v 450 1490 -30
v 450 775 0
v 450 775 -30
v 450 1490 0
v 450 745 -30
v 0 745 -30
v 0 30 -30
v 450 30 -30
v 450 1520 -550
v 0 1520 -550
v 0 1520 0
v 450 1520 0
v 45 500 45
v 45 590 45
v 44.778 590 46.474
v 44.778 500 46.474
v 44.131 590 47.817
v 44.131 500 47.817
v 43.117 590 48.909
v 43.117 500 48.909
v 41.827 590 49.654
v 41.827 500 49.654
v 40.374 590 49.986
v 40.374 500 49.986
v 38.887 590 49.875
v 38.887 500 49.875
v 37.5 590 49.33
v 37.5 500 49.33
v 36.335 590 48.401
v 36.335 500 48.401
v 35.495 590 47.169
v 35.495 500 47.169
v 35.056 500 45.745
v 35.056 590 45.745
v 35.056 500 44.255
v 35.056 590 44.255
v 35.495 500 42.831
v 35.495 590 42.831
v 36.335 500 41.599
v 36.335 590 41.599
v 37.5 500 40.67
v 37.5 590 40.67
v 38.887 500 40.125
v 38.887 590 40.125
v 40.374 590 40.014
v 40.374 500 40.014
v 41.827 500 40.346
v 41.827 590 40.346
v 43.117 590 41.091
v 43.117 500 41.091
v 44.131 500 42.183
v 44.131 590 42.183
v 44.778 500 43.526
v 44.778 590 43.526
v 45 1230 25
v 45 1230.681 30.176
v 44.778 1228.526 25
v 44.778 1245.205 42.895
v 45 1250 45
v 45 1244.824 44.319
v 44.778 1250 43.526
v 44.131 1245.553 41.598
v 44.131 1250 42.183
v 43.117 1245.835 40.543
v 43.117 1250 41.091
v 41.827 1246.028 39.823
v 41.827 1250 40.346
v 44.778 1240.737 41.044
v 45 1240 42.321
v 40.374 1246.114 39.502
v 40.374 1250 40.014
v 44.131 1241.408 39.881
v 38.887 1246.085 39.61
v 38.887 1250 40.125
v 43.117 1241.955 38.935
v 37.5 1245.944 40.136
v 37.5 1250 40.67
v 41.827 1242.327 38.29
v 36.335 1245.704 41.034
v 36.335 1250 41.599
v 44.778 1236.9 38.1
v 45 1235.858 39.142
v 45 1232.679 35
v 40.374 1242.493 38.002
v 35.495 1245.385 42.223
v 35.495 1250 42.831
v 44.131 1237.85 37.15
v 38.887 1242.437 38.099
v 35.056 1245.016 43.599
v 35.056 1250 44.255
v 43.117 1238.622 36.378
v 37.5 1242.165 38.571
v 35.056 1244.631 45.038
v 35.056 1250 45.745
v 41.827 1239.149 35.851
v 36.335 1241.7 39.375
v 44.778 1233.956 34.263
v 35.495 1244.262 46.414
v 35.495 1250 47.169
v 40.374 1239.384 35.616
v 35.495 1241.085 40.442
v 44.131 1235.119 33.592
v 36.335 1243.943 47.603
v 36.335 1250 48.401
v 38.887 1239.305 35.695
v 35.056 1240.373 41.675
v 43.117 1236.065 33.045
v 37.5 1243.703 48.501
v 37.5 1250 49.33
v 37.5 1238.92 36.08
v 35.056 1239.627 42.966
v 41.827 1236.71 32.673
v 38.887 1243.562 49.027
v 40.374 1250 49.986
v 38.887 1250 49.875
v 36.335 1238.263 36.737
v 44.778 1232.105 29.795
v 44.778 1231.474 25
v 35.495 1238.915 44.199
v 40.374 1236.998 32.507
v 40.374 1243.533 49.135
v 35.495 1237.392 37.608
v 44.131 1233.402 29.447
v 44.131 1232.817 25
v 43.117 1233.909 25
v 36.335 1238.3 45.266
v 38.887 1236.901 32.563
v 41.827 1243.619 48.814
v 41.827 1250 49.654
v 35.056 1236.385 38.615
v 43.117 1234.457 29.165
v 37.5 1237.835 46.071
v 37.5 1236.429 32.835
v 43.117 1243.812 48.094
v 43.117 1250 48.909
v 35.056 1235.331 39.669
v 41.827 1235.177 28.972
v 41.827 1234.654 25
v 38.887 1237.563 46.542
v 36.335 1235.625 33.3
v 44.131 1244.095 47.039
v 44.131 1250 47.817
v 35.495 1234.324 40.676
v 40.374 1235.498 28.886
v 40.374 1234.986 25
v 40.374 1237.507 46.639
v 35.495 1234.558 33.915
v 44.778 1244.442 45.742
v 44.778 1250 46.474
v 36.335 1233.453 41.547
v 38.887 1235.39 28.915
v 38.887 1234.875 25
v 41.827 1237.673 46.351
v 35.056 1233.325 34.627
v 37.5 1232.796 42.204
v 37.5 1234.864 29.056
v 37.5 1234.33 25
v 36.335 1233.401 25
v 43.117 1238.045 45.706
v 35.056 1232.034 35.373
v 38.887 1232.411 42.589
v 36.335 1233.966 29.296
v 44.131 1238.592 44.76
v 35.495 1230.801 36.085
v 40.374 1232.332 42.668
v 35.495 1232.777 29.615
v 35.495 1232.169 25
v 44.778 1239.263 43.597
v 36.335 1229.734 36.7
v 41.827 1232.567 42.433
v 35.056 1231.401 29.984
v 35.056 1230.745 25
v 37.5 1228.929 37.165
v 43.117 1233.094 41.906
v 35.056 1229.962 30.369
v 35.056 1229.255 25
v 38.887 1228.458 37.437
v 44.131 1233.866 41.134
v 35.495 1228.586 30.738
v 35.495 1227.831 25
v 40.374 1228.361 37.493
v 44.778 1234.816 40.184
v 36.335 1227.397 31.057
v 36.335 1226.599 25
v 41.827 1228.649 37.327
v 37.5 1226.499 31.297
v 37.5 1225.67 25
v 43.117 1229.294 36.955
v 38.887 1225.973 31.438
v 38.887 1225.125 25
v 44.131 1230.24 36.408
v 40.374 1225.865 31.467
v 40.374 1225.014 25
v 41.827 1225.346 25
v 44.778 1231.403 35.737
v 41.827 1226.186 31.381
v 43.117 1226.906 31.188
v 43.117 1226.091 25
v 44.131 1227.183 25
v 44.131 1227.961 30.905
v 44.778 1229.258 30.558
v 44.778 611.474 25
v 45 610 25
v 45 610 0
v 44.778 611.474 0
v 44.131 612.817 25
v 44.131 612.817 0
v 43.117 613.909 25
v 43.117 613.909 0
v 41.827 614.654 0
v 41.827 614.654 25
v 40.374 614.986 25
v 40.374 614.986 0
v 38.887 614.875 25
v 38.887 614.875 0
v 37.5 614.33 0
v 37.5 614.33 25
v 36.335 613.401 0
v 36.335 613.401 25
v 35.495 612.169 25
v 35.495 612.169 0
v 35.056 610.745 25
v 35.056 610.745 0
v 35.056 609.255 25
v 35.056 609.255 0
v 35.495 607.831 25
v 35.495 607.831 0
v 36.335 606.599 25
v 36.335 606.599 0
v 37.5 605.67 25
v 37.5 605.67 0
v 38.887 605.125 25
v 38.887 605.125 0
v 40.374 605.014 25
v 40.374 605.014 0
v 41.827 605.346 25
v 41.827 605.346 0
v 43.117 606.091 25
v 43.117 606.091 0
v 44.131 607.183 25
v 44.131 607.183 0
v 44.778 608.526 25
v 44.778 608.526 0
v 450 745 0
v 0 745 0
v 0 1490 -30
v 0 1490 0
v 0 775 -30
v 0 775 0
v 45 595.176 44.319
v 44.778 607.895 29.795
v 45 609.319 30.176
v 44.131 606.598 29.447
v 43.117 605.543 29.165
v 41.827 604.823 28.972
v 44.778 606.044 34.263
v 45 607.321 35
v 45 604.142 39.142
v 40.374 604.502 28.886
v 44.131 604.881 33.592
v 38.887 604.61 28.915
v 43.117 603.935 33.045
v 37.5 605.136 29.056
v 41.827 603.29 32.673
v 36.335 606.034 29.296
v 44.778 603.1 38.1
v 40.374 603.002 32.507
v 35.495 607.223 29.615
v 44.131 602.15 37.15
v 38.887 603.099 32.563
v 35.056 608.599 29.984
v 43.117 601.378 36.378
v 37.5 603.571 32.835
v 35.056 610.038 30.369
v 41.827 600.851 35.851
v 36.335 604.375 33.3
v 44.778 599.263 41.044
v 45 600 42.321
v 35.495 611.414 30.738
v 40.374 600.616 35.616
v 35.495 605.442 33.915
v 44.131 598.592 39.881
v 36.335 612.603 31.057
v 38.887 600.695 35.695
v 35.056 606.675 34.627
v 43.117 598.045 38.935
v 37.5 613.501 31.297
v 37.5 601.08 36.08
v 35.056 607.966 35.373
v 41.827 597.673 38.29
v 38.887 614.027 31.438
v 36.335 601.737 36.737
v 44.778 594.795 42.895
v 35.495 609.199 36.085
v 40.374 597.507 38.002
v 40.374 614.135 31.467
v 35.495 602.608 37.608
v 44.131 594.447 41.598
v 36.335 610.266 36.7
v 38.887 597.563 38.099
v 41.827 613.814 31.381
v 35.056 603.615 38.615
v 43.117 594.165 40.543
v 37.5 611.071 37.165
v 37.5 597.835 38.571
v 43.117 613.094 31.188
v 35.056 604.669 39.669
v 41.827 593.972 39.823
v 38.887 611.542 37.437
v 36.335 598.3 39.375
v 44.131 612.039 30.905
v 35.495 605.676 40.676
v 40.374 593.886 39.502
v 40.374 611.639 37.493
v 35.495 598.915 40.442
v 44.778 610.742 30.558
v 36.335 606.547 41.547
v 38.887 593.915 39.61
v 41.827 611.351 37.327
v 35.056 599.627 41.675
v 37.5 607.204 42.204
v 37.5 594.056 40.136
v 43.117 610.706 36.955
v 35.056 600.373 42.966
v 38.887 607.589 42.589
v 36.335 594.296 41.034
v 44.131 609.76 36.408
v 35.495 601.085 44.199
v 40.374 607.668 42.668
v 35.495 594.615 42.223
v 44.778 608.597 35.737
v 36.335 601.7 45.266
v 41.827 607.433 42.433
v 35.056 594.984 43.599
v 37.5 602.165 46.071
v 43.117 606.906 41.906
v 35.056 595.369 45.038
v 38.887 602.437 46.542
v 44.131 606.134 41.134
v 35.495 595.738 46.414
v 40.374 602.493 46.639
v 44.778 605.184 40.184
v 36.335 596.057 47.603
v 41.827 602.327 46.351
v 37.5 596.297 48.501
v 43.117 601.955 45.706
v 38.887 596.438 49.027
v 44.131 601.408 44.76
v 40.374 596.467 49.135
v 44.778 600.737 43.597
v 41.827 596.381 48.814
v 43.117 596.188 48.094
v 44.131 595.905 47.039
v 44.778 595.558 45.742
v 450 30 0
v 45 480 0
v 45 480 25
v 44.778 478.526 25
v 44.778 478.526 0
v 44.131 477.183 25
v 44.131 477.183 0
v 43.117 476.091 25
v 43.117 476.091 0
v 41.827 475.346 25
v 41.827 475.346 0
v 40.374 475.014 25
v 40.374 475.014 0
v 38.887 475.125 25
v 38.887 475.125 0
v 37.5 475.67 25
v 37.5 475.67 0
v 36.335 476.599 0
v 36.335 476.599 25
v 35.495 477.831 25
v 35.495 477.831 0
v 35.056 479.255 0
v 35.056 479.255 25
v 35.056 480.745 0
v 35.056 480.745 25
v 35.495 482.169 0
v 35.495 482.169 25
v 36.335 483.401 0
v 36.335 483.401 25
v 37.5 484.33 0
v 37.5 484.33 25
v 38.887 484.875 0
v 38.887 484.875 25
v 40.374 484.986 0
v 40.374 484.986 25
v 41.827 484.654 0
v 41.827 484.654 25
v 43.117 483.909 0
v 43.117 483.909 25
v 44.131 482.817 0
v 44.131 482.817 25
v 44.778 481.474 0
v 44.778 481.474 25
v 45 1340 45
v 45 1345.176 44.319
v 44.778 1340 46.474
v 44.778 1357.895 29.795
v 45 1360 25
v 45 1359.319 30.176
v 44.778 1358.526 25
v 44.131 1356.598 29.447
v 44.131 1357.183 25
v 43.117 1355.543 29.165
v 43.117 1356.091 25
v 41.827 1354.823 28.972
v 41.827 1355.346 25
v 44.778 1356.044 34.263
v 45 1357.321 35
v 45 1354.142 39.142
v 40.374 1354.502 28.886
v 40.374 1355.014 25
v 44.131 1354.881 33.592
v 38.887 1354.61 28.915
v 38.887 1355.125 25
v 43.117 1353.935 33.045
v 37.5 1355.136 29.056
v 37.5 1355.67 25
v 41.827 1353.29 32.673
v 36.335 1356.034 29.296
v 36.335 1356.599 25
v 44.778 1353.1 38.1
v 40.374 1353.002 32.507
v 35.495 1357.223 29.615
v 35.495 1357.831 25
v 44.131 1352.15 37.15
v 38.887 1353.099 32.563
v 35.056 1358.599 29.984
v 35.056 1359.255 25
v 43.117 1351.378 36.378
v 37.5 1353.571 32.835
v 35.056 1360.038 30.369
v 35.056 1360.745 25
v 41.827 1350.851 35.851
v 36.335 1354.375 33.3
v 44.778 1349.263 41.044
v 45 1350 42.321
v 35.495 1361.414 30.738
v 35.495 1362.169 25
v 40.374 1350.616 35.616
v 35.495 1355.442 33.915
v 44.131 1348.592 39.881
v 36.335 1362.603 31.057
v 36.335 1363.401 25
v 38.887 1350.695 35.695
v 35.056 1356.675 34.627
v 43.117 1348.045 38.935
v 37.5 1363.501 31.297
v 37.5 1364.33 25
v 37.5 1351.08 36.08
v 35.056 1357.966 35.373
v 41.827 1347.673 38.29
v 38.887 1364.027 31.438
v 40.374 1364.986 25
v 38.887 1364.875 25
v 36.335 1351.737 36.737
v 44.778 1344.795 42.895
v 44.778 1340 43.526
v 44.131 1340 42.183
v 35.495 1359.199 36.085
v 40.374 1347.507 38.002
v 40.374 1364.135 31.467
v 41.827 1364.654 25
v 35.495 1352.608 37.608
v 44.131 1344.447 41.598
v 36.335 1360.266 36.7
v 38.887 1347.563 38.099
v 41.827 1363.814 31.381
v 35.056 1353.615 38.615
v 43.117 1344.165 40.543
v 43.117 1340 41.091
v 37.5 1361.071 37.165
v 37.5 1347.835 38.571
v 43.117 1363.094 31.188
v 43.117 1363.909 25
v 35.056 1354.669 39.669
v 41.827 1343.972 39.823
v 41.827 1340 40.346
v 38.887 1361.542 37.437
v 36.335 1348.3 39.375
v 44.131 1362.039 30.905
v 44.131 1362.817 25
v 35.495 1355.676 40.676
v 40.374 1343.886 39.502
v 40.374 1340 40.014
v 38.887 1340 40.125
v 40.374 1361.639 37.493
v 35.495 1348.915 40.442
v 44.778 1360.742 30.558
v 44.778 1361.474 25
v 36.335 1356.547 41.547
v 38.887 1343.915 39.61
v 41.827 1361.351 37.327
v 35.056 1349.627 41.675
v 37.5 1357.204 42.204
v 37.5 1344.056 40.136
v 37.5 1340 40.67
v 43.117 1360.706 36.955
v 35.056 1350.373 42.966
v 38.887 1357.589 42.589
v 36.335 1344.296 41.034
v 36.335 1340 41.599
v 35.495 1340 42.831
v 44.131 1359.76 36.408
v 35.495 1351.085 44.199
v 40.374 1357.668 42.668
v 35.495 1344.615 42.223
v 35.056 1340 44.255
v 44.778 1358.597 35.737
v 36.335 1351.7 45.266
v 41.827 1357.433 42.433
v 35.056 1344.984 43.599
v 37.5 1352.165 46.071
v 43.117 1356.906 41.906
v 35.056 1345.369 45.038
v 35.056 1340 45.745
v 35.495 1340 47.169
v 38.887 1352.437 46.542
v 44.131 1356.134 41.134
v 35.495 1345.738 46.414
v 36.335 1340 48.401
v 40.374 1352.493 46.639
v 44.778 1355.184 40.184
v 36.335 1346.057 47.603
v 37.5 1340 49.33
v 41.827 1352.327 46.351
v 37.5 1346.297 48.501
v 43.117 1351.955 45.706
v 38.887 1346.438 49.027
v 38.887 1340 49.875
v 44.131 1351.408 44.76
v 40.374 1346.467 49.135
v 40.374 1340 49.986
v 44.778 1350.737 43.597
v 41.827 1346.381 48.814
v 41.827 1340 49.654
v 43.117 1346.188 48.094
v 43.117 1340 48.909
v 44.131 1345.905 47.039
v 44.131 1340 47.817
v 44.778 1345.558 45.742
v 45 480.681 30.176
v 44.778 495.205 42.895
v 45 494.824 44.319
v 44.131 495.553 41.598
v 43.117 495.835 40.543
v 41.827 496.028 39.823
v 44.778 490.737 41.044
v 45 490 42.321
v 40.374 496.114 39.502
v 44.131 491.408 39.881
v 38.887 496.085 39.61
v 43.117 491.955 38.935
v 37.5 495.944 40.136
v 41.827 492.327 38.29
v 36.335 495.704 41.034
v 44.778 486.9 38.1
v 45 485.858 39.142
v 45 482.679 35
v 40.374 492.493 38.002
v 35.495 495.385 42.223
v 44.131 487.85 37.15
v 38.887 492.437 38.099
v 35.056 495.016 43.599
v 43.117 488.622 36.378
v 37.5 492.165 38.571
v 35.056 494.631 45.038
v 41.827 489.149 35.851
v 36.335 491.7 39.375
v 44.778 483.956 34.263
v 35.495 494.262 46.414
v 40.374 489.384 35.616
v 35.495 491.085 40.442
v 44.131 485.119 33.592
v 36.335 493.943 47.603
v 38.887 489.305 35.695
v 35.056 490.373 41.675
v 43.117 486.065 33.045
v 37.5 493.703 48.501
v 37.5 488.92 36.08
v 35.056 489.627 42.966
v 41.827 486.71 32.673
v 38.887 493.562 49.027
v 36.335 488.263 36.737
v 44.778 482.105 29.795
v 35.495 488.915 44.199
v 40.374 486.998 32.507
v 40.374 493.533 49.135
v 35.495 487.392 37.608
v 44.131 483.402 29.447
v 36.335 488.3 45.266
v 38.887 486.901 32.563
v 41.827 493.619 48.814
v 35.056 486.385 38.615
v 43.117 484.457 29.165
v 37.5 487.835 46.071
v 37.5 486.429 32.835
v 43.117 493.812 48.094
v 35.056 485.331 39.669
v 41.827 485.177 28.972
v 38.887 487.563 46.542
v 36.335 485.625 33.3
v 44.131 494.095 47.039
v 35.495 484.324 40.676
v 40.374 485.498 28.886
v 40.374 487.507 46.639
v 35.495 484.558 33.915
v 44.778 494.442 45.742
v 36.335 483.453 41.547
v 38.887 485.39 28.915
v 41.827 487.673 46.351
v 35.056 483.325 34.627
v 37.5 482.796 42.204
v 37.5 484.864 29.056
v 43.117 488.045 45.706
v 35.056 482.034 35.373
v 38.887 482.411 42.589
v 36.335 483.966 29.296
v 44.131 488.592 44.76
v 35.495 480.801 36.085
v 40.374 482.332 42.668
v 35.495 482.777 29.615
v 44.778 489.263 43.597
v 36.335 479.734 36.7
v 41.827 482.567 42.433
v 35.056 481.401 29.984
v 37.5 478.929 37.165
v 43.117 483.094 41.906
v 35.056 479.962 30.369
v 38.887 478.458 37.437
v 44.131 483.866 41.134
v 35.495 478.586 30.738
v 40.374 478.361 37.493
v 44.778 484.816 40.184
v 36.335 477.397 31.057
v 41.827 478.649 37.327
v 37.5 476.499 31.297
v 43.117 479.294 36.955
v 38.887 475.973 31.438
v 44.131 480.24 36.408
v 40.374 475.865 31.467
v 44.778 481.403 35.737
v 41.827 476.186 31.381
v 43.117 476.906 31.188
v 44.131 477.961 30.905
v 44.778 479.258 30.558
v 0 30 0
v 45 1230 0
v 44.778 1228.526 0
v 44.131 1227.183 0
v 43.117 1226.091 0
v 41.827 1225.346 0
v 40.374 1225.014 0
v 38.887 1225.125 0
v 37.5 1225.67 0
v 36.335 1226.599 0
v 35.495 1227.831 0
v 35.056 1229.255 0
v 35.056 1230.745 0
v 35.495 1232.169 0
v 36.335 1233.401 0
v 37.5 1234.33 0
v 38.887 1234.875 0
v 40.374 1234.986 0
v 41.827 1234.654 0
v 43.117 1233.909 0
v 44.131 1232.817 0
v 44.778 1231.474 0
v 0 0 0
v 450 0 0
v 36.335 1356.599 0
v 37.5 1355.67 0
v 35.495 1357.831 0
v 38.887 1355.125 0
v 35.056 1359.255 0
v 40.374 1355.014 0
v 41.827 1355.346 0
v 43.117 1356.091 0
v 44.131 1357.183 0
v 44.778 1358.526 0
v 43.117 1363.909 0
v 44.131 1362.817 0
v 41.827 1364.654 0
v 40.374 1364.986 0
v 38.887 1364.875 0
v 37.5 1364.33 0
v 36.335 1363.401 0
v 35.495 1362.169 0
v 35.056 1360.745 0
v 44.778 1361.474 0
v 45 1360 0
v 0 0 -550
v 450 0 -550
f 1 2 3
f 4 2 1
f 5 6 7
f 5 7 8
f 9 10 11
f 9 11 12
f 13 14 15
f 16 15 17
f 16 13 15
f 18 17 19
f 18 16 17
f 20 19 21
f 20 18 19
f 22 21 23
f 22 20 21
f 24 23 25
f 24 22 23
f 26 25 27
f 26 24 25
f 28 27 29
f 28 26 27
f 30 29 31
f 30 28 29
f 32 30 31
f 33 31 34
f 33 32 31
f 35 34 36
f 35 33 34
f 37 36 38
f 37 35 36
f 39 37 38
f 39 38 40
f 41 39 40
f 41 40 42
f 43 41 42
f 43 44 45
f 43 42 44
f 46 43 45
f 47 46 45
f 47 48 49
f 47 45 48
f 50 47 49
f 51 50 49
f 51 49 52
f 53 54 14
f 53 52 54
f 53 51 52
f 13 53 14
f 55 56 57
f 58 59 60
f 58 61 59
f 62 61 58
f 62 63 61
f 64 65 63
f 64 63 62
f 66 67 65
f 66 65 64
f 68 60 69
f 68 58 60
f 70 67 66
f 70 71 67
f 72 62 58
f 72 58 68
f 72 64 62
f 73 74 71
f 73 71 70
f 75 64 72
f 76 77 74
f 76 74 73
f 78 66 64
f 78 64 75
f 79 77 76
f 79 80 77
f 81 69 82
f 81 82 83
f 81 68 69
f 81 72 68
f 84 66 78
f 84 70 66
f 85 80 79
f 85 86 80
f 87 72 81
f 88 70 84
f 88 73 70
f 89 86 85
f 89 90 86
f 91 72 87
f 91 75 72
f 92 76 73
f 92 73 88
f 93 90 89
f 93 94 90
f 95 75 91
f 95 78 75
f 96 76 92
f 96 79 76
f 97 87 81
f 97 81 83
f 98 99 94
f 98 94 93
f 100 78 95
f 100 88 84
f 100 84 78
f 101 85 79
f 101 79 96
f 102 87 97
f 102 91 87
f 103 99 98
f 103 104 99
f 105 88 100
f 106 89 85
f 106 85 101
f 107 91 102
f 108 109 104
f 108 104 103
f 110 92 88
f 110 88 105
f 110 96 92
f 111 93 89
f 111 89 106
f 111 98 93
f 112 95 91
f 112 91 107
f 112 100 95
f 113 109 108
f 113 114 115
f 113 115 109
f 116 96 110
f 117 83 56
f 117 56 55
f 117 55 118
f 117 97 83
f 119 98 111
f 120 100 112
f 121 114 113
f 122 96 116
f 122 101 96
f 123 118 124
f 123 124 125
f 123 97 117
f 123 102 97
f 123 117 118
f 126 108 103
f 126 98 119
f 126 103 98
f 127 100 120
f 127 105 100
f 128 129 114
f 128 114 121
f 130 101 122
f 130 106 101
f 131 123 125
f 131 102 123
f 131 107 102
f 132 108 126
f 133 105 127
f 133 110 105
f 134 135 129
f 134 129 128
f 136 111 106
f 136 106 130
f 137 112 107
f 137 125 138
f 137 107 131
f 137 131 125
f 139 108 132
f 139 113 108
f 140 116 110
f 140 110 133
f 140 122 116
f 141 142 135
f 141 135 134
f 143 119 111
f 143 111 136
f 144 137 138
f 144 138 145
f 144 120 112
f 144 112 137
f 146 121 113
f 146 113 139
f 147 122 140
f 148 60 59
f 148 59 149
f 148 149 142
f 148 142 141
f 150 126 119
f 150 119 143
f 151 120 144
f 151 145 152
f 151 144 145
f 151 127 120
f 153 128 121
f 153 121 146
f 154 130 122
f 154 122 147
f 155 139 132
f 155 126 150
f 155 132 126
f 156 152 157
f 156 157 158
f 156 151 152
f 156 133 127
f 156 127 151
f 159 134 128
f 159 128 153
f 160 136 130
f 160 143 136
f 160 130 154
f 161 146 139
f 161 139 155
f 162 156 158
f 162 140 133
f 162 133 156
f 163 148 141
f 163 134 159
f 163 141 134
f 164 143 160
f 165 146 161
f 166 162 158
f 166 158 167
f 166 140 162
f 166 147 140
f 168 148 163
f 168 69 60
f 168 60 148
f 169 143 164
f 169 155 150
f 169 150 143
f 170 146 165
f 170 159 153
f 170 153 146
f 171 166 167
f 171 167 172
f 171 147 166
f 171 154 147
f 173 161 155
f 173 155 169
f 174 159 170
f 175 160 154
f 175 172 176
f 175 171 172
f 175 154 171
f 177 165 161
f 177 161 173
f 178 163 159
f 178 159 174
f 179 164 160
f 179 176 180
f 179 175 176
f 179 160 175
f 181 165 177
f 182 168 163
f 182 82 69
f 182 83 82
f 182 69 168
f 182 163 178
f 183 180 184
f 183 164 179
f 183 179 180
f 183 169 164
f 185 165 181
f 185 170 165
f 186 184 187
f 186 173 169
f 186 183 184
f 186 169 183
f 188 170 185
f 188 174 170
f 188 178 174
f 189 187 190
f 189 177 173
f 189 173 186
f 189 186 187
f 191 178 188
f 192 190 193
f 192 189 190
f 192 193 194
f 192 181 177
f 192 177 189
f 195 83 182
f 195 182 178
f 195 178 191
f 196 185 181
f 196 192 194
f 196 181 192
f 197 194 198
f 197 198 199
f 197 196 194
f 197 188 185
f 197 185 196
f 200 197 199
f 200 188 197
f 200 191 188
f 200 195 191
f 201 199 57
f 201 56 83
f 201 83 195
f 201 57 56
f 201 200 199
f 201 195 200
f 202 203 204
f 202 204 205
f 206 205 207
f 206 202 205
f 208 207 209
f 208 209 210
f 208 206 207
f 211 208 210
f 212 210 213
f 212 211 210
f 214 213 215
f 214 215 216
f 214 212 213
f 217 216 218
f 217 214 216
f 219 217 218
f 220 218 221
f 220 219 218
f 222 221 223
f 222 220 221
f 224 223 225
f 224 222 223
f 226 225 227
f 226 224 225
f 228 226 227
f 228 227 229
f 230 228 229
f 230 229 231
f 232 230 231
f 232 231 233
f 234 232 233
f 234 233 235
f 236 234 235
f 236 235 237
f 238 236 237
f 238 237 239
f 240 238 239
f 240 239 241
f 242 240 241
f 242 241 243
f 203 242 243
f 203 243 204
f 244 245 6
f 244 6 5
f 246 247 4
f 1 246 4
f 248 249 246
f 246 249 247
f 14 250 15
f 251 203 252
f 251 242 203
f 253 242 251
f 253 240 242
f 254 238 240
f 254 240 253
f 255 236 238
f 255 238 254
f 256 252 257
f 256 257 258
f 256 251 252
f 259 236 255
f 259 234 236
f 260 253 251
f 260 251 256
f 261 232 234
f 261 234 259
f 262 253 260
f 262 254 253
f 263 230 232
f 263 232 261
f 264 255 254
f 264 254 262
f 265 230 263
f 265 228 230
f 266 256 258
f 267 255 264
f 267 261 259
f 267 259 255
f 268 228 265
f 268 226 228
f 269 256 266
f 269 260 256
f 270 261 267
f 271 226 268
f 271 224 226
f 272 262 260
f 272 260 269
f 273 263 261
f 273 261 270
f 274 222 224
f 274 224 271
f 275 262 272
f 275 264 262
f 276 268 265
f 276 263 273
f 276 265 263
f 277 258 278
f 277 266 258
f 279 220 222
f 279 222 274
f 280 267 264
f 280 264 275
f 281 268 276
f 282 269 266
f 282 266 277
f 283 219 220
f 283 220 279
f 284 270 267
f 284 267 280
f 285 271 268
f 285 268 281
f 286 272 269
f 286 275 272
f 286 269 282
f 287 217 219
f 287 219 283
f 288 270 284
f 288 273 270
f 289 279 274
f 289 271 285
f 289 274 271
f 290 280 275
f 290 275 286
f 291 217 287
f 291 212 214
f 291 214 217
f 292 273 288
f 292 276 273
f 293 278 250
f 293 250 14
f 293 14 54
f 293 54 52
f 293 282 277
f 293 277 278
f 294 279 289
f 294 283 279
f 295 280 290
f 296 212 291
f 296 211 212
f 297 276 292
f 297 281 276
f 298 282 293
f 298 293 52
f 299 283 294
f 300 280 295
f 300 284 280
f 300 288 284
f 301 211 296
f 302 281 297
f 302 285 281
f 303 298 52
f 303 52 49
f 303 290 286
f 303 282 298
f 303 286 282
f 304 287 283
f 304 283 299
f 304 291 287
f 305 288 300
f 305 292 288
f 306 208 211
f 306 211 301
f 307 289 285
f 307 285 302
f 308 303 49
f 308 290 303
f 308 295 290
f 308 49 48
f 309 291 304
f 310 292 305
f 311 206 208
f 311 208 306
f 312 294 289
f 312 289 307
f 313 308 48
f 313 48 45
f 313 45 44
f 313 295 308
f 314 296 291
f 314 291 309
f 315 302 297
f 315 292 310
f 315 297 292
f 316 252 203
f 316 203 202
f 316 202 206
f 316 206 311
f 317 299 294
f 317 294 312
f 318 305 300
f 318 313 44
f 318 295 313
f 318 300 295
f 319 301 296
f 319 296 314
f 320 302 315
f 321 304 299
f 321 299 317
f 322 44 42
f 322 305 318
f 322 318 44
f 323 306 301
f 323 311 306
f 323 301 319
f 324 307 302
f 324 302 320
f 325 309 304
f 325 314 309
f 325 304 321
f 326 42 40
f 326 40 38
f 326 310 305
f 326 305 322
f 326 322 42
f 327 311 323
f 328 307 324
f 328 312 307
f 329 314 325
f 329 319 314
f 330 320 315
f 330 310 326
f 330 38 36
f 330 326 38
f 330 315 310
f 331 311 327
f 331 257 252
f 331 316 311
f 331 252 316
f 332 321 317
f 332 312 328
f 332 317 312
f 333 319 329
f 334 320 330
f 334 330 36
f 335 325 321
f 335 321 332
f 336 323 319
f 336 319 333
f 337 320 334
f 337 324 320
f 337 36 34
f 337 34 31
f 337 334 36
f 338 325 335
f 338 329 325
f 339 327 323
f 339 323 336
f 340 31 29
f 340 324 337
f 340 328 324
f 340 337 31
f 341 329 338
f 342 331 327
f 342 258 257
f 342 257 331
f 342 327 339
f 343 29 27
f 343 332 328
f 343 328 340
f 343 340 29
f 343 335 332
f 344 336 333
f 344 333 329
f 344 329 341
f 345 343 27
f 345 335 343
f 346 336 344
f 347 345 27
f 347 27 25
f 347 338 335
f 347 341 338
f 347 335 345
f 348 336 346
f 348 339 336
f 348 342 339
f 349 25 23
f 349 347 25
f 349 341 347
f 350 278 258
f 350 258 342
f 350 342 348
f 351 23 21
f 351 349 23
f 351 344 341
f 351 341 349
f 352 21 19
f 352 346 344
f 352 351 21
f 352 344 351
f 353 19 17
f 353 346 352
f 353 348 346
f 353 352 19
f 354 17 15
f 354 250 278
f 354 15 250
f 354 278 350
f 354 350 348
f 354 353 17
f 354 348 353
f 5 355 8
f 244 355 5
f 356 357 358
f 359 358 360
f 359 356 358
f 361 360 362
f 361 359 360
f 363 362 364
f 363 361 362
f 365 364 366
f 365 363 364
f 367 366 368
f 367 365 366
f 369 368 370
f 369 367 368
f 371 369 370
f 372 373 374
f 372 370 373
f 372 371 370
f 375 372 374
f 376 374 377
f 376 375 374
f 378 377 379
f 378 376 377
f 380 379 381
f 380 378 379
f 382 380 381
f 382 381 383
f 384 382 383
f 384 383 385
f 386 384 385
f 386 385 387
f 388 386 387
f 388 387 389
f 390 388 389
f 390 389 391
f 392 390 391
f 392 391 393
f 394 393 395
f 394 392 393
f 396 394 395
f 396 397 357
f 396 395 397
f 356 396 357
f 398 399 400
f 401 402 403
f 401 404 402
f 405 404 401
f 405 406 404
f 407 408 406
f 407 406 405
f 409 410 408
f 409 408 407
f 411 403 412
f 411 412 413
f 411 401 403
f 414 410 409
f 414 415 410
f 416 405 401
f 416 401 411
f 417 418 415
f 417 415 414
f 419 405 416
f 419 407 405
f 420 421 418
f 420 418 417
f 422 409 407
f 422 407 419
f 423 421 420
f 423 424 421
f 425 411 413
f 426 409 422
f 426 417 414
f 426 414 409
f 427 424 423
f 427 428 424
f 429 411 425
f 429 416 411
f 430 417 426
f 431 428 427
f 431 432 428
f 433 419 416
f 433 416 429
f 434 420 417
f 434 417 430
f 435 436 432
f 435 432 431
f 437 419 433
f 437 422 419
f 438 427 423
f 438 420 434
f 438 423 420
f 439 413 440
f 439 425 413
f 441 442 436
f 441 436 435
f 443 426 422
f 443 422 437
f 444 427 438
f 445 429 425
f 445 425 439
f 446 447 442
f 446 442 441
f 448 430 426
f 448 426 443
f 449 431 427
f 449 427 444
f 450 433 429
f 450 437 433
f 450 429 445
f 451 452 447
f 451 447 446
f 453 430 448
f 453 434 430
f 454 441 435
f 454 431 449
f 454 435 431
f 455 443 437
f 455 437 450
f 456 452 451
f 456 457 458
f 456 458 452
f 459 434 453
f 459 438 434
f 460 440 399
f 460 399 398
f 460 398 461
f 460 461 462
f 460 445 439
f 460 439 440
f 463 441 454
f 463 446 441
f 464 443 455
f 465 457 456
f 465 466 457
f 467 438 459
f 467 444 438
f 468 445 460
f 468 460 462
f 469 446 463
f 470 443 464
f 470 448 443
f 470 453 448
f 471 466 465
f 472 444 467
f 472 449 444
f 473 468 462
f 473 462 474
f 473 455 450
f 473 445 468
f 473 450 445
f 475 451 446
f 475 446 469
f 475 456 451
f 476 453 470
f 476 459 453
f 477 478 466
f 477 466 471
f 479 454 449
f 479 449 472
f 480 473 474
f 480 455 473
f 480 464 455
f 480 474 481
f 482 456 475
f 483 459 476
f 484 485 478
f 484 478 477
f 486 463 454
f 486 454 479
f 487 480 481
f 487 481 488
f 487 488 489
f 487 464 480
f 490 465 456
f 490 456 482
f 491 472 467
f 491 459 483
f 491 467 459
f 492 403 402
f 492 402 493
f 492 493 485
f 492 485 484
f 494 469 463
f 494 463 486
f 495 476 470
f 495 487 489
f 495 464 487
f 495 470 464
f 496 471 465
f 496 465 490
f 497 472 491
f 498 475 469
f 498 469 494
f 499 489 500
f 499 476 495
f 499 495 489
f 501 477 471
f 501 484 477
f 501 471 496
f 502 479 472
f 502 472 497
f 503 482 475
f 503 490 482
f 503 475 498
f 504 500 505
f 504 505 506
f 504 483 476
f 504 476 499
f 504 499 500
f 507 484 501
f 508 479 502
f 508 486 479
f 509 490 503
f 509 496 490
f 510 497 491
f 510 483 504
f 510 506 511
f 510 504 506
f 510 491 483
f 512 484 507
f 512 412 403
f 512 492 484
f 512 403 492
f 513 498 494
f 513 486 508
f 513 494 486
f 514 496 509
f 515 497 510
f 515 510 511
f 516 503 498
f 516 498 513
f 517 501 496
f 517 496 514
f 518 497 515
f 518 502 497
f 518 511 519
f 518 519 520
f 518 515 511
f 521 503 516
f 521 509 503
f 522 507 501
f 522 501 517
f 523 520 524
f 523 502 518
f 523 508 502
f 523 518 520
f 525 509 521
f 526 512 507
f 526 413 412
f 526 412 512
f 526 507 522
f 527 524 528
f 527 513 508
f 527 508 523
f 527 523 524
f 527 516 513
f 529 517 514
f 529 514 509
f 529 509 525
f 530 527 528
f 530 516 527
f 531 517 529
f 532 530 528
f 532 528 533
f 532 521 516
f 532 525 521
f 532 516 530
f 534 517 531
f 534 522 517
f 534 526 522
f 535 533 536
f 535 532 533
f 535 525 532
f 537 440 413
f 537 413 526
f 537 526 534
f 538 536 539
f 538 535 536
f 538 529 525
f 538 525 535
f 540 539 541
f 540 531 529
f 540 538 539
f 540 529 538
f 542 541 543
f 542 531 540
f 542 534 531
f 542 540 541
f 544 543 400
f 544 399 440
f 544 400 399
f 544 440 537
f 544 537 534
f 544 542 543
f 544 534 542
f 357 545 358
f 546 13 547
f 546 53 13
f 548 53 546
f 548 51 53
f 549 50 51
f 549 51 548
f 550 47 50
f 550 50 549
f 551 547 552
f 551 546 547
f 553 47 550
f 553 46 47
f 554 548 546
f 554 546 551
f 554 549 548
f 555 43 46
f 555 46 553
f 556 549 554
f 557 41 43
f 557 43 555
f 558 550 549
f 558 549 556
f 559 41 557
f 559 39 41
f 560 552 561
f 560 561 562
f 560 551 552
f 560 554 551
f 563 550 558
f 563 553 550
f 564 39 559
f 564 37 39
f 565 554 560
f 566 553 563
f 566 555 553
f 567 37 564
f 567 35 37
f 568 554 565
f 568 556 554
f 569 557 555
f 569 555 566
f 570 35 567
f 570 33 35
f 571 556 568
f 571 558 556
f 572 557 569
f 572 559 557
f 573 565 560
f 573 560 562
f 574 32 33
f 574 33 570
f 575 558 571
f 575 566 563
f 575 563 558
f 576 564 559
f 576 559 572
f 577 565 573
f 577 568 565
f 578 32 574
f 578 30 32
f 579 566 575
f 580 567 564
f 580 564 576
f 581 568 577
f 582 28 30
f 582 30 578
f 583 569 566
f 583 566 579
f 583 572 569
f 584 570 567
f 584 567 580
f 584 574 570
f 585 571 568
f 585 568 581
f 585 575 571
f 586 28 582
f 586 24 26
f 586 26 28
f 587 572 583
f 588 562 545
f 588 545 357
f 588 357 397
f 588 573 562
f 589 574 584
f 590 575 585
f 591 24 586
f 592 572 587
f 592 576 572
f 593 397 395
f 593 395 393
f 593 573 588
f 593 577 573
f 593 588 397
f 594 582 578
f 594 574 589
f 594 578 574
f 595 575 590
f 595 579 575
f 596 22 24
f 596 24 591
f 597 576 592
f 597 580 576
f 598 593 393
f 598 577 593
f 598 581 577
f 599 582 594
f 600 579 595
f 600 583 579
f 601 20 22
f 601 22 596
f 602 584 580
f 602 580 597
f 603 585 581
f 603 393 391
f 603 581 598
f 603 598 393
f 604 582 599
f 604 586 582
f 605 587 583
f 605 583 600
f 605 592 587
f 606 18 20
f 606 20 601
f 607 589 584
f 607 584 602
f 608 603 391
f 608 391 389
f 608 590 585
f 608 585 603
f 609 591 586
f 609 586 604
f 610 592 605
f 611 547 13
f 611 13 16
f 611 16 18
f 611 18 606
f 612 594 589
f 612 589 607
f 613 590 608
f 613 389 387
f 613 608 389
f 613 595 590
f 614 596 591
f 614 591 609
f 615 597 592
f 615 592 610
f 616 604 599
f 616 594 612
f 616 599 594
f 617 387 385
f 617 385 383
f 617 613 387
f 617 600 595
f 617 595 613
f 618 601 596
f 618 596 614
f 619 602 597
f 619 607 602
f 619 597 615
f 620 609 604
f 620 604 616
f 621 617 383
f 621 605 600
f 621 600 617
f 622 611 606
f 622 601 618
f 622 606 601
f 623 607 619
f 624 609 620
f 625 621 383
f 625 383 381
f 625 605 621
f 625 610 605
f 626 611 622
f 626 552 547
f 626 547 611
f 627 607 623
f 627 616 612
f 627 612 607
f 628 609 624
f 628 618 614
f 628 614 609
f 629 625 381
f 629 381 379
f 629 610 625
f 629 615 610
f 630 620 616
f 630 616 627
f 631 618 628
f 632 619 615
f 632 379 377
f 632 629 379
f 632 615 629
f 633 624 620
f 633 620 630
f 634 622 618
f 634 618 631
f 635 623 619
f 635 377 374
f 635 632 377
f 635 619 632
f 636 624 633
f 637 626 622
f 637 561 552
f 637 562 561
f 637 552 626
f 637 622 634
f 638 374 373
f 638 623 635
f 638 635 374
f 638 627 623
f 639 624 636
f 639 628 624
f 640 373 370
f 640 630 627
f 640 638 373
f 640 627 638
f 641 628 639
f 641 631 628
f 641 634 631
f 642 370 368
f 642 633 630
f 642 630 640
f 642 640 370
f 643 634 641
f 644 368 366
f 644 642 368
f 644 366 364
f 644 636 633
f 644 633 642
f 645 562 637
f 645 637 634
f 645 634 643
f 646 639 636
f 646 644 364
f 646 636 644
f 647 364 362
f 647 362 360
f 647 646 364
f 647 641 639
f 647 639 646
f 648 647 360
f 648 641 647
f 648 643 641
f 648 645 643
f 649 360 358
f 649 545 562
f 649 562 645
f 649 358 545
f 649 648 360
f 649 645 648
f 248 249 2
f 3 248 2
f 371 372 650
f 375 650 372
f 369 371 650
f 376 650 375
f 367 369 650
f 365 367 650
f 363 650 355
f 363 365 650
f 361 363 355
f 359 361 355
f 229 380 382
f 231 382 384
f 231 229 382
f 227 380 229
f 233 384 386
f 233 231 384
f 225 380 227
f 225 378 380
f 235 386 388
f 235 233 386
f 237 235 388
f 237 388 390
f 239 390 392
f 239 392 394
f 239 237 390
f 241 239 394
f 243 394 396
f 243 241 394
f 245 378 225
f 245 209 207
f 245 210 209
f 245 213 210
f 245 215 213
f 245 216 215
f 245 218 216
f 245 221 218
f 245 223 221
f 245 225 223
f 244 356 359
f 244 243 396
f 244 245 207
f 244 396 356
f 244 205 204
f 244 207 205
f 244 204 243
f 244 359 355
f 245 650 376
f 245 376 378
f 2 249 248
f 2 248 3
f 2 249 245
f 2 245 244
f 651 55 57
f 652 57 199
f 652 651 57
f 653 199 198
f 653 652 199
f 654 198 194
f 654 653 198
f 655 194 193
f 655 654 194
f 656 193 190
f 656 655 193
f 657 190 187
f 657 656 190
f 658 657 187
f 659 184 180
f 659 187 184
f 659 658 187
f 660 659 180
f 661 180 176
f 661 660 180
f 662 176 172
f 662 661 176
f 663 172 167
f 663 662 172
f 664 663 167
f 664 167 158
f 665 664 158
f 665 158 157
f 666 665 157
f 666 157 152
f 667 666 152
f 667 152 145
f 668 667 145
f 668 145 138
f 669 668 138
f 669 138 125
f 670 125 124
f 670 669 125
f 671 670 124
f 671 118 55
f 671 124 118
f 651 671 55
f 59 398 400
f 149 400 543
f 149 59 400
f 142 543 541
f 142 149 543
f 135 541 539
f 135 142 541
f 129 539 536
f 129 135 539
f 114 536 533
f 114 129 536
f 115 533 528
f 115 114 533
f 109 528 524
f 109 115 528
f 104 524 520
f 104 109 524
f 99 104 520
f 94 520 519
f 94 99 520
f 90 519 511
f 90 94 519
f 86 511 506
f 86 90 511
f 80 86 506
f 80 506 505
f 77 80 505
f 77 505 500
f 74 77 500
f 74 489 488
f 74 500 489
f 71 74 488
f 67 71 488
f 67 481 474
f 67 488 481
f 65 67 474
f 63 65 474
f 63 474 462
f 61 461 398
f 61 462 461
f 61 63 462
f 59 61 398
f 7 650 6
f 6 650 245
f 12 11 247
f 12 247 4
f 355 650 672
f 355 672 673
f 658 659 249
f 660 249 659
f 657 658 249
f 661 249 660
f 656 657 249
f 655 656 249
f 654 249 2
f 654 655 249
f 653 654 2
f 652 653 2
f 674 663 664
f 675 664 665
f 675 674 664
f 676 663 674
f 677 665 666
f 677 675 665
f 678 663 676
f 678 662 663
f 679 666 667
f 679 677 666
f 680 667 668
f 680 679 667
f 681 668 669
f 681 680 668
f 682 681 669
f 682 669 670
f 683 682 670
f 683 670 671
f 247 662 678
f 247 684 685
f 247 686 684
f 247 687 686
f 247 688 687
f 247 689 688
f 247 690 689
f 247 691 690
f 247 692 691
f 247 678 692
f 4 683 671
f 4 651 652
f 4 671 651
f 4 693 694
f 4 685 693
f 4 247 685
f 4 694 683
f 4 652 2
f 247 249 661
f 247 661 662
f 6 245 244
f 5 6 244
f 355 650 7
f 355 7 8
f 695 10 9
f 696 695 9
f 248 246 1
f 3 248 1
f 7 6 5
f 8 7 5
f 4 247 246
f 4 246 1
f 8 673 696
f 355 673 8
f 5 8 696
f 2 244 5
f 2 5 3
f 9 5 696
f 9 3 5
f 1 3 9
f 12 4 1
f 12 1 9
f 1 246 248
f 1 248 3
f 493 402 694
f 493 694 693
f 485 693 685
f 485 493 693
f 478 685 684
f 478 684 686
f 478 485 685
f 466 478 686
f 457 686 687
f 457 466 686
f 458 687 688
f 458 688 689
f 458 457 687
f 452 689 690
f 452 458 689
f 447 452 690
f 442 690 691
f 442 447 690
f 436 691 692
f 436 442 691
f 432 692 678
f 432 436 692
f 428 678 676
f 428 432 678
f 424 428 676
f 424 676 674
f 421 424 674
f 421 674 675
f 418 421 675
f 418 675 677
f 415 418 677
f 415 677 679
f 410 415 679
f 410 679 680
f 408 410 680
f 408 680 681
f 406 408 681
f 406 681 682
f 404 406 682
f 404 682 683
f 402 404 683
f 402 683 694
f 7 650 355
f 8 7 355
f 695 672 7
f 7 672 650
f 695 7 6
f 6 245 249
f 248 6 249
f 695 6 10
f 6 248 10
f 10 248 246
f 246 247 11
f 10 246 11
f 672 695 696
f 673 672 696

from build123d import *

# Parameters (mm, degrees)
SKETCH1_W             = 450
SKETCH1_H             = 1520
BOSS_EXTRUDE1_DEPTH   = 550
SKETCH2_W             = 450
SKETCH2_H             = 715
CUT_EXTRUDE1_DEPTH    = 30
SKETCH2_2_W           = 450
SKETCH2_2_H           = 715
BOSS_EXTRUDE2_DEPTH   = 30
BOSS_EXTRUDE2_2_DEPTH = 30
SKETCH4_R             = 5
LPATTERN1_COUNT       = 2
LPATTERN1_PITCH       = 750


with BuildPart() as part:
    # Sketch1 → Boss-Extrude1 (new body)
    with BuildSketch(Plane.XY):
        with Locations((225, 760)):
            Rectangle(SKETCH1_W, SKETCH1_H)
    extrude(amount=-BOSS_EXTRUDE1_DEPTH)

    # Sketch2 → Cut-Extrude1 (cut)
    with BuildSketch(Plane.XY):
        with Locations((225, 1132.5)):
            Rectangle(SKETCH2_W, SKETCH2_H)
        with Locations((225, 387.5)):
            Rectangle(SKETCH2_W, SKETCH2_H)
    extrude(amount=-CUT_EXTRUDE1_DEPTH, mode=Mode.SUBTRACT)


with BuildPart() as body_2:
    # Sketch2<2> → Boss-Extrude2 (new body)
    with BuildSketch(Plane.XY):
        with Locations((225, 1132.5)):
            Rectangle(SKETCH2_2_W, SKETCH2_2_H)
    extrude(amount=-BOSS_EXTRUDE2_DEPTH)

    # Sweep5: sweep along a path in Sketch3
    with BuildLine(Plane.ZY.offset(-40)) as sweep5_path:
        Line((0, 1360), (25, 1360))
        ThreePointArc((25, 1360), (39.142135624, 1354.142135624), (45, 1340))
        Line((45, 1340), (45, 1250))
        ThreePointArc((45, 1250), (39.142135624, 1235.857864376), (25, 1230))
        Line((25, 1230), (0, 1230))
    # Sketch4 → Sweep5 (sweep)
    with BuildSketch(Plane.XY):
        with Locations((40, 1360)):
            Circle(SKETCH4_R)
    sweep5 = sweep(path=sweep5_path.line)


with BuildPart() as body_3:
    # Sketch2<2> → Boss-Extrude2 2 (new body)
    with BuildSketch(Plane.XY):
        with Locations((225, 387.5)):
            Rectangle(SKETCH2_2_W, SKETCH2_2_H)
    extrude(amount=-BOSS_EXTRUDE2_2_DEPTH)

    # LPattern1: Sweep5 ×2
    with Locations(*[(0, -i * LPATTERN1_PITCH, 0) for i in range(1, LPATTERN1_COUNT)]):
        add(sweep5)


solid = Compound([part.part, body_2.part, body_3.part])
